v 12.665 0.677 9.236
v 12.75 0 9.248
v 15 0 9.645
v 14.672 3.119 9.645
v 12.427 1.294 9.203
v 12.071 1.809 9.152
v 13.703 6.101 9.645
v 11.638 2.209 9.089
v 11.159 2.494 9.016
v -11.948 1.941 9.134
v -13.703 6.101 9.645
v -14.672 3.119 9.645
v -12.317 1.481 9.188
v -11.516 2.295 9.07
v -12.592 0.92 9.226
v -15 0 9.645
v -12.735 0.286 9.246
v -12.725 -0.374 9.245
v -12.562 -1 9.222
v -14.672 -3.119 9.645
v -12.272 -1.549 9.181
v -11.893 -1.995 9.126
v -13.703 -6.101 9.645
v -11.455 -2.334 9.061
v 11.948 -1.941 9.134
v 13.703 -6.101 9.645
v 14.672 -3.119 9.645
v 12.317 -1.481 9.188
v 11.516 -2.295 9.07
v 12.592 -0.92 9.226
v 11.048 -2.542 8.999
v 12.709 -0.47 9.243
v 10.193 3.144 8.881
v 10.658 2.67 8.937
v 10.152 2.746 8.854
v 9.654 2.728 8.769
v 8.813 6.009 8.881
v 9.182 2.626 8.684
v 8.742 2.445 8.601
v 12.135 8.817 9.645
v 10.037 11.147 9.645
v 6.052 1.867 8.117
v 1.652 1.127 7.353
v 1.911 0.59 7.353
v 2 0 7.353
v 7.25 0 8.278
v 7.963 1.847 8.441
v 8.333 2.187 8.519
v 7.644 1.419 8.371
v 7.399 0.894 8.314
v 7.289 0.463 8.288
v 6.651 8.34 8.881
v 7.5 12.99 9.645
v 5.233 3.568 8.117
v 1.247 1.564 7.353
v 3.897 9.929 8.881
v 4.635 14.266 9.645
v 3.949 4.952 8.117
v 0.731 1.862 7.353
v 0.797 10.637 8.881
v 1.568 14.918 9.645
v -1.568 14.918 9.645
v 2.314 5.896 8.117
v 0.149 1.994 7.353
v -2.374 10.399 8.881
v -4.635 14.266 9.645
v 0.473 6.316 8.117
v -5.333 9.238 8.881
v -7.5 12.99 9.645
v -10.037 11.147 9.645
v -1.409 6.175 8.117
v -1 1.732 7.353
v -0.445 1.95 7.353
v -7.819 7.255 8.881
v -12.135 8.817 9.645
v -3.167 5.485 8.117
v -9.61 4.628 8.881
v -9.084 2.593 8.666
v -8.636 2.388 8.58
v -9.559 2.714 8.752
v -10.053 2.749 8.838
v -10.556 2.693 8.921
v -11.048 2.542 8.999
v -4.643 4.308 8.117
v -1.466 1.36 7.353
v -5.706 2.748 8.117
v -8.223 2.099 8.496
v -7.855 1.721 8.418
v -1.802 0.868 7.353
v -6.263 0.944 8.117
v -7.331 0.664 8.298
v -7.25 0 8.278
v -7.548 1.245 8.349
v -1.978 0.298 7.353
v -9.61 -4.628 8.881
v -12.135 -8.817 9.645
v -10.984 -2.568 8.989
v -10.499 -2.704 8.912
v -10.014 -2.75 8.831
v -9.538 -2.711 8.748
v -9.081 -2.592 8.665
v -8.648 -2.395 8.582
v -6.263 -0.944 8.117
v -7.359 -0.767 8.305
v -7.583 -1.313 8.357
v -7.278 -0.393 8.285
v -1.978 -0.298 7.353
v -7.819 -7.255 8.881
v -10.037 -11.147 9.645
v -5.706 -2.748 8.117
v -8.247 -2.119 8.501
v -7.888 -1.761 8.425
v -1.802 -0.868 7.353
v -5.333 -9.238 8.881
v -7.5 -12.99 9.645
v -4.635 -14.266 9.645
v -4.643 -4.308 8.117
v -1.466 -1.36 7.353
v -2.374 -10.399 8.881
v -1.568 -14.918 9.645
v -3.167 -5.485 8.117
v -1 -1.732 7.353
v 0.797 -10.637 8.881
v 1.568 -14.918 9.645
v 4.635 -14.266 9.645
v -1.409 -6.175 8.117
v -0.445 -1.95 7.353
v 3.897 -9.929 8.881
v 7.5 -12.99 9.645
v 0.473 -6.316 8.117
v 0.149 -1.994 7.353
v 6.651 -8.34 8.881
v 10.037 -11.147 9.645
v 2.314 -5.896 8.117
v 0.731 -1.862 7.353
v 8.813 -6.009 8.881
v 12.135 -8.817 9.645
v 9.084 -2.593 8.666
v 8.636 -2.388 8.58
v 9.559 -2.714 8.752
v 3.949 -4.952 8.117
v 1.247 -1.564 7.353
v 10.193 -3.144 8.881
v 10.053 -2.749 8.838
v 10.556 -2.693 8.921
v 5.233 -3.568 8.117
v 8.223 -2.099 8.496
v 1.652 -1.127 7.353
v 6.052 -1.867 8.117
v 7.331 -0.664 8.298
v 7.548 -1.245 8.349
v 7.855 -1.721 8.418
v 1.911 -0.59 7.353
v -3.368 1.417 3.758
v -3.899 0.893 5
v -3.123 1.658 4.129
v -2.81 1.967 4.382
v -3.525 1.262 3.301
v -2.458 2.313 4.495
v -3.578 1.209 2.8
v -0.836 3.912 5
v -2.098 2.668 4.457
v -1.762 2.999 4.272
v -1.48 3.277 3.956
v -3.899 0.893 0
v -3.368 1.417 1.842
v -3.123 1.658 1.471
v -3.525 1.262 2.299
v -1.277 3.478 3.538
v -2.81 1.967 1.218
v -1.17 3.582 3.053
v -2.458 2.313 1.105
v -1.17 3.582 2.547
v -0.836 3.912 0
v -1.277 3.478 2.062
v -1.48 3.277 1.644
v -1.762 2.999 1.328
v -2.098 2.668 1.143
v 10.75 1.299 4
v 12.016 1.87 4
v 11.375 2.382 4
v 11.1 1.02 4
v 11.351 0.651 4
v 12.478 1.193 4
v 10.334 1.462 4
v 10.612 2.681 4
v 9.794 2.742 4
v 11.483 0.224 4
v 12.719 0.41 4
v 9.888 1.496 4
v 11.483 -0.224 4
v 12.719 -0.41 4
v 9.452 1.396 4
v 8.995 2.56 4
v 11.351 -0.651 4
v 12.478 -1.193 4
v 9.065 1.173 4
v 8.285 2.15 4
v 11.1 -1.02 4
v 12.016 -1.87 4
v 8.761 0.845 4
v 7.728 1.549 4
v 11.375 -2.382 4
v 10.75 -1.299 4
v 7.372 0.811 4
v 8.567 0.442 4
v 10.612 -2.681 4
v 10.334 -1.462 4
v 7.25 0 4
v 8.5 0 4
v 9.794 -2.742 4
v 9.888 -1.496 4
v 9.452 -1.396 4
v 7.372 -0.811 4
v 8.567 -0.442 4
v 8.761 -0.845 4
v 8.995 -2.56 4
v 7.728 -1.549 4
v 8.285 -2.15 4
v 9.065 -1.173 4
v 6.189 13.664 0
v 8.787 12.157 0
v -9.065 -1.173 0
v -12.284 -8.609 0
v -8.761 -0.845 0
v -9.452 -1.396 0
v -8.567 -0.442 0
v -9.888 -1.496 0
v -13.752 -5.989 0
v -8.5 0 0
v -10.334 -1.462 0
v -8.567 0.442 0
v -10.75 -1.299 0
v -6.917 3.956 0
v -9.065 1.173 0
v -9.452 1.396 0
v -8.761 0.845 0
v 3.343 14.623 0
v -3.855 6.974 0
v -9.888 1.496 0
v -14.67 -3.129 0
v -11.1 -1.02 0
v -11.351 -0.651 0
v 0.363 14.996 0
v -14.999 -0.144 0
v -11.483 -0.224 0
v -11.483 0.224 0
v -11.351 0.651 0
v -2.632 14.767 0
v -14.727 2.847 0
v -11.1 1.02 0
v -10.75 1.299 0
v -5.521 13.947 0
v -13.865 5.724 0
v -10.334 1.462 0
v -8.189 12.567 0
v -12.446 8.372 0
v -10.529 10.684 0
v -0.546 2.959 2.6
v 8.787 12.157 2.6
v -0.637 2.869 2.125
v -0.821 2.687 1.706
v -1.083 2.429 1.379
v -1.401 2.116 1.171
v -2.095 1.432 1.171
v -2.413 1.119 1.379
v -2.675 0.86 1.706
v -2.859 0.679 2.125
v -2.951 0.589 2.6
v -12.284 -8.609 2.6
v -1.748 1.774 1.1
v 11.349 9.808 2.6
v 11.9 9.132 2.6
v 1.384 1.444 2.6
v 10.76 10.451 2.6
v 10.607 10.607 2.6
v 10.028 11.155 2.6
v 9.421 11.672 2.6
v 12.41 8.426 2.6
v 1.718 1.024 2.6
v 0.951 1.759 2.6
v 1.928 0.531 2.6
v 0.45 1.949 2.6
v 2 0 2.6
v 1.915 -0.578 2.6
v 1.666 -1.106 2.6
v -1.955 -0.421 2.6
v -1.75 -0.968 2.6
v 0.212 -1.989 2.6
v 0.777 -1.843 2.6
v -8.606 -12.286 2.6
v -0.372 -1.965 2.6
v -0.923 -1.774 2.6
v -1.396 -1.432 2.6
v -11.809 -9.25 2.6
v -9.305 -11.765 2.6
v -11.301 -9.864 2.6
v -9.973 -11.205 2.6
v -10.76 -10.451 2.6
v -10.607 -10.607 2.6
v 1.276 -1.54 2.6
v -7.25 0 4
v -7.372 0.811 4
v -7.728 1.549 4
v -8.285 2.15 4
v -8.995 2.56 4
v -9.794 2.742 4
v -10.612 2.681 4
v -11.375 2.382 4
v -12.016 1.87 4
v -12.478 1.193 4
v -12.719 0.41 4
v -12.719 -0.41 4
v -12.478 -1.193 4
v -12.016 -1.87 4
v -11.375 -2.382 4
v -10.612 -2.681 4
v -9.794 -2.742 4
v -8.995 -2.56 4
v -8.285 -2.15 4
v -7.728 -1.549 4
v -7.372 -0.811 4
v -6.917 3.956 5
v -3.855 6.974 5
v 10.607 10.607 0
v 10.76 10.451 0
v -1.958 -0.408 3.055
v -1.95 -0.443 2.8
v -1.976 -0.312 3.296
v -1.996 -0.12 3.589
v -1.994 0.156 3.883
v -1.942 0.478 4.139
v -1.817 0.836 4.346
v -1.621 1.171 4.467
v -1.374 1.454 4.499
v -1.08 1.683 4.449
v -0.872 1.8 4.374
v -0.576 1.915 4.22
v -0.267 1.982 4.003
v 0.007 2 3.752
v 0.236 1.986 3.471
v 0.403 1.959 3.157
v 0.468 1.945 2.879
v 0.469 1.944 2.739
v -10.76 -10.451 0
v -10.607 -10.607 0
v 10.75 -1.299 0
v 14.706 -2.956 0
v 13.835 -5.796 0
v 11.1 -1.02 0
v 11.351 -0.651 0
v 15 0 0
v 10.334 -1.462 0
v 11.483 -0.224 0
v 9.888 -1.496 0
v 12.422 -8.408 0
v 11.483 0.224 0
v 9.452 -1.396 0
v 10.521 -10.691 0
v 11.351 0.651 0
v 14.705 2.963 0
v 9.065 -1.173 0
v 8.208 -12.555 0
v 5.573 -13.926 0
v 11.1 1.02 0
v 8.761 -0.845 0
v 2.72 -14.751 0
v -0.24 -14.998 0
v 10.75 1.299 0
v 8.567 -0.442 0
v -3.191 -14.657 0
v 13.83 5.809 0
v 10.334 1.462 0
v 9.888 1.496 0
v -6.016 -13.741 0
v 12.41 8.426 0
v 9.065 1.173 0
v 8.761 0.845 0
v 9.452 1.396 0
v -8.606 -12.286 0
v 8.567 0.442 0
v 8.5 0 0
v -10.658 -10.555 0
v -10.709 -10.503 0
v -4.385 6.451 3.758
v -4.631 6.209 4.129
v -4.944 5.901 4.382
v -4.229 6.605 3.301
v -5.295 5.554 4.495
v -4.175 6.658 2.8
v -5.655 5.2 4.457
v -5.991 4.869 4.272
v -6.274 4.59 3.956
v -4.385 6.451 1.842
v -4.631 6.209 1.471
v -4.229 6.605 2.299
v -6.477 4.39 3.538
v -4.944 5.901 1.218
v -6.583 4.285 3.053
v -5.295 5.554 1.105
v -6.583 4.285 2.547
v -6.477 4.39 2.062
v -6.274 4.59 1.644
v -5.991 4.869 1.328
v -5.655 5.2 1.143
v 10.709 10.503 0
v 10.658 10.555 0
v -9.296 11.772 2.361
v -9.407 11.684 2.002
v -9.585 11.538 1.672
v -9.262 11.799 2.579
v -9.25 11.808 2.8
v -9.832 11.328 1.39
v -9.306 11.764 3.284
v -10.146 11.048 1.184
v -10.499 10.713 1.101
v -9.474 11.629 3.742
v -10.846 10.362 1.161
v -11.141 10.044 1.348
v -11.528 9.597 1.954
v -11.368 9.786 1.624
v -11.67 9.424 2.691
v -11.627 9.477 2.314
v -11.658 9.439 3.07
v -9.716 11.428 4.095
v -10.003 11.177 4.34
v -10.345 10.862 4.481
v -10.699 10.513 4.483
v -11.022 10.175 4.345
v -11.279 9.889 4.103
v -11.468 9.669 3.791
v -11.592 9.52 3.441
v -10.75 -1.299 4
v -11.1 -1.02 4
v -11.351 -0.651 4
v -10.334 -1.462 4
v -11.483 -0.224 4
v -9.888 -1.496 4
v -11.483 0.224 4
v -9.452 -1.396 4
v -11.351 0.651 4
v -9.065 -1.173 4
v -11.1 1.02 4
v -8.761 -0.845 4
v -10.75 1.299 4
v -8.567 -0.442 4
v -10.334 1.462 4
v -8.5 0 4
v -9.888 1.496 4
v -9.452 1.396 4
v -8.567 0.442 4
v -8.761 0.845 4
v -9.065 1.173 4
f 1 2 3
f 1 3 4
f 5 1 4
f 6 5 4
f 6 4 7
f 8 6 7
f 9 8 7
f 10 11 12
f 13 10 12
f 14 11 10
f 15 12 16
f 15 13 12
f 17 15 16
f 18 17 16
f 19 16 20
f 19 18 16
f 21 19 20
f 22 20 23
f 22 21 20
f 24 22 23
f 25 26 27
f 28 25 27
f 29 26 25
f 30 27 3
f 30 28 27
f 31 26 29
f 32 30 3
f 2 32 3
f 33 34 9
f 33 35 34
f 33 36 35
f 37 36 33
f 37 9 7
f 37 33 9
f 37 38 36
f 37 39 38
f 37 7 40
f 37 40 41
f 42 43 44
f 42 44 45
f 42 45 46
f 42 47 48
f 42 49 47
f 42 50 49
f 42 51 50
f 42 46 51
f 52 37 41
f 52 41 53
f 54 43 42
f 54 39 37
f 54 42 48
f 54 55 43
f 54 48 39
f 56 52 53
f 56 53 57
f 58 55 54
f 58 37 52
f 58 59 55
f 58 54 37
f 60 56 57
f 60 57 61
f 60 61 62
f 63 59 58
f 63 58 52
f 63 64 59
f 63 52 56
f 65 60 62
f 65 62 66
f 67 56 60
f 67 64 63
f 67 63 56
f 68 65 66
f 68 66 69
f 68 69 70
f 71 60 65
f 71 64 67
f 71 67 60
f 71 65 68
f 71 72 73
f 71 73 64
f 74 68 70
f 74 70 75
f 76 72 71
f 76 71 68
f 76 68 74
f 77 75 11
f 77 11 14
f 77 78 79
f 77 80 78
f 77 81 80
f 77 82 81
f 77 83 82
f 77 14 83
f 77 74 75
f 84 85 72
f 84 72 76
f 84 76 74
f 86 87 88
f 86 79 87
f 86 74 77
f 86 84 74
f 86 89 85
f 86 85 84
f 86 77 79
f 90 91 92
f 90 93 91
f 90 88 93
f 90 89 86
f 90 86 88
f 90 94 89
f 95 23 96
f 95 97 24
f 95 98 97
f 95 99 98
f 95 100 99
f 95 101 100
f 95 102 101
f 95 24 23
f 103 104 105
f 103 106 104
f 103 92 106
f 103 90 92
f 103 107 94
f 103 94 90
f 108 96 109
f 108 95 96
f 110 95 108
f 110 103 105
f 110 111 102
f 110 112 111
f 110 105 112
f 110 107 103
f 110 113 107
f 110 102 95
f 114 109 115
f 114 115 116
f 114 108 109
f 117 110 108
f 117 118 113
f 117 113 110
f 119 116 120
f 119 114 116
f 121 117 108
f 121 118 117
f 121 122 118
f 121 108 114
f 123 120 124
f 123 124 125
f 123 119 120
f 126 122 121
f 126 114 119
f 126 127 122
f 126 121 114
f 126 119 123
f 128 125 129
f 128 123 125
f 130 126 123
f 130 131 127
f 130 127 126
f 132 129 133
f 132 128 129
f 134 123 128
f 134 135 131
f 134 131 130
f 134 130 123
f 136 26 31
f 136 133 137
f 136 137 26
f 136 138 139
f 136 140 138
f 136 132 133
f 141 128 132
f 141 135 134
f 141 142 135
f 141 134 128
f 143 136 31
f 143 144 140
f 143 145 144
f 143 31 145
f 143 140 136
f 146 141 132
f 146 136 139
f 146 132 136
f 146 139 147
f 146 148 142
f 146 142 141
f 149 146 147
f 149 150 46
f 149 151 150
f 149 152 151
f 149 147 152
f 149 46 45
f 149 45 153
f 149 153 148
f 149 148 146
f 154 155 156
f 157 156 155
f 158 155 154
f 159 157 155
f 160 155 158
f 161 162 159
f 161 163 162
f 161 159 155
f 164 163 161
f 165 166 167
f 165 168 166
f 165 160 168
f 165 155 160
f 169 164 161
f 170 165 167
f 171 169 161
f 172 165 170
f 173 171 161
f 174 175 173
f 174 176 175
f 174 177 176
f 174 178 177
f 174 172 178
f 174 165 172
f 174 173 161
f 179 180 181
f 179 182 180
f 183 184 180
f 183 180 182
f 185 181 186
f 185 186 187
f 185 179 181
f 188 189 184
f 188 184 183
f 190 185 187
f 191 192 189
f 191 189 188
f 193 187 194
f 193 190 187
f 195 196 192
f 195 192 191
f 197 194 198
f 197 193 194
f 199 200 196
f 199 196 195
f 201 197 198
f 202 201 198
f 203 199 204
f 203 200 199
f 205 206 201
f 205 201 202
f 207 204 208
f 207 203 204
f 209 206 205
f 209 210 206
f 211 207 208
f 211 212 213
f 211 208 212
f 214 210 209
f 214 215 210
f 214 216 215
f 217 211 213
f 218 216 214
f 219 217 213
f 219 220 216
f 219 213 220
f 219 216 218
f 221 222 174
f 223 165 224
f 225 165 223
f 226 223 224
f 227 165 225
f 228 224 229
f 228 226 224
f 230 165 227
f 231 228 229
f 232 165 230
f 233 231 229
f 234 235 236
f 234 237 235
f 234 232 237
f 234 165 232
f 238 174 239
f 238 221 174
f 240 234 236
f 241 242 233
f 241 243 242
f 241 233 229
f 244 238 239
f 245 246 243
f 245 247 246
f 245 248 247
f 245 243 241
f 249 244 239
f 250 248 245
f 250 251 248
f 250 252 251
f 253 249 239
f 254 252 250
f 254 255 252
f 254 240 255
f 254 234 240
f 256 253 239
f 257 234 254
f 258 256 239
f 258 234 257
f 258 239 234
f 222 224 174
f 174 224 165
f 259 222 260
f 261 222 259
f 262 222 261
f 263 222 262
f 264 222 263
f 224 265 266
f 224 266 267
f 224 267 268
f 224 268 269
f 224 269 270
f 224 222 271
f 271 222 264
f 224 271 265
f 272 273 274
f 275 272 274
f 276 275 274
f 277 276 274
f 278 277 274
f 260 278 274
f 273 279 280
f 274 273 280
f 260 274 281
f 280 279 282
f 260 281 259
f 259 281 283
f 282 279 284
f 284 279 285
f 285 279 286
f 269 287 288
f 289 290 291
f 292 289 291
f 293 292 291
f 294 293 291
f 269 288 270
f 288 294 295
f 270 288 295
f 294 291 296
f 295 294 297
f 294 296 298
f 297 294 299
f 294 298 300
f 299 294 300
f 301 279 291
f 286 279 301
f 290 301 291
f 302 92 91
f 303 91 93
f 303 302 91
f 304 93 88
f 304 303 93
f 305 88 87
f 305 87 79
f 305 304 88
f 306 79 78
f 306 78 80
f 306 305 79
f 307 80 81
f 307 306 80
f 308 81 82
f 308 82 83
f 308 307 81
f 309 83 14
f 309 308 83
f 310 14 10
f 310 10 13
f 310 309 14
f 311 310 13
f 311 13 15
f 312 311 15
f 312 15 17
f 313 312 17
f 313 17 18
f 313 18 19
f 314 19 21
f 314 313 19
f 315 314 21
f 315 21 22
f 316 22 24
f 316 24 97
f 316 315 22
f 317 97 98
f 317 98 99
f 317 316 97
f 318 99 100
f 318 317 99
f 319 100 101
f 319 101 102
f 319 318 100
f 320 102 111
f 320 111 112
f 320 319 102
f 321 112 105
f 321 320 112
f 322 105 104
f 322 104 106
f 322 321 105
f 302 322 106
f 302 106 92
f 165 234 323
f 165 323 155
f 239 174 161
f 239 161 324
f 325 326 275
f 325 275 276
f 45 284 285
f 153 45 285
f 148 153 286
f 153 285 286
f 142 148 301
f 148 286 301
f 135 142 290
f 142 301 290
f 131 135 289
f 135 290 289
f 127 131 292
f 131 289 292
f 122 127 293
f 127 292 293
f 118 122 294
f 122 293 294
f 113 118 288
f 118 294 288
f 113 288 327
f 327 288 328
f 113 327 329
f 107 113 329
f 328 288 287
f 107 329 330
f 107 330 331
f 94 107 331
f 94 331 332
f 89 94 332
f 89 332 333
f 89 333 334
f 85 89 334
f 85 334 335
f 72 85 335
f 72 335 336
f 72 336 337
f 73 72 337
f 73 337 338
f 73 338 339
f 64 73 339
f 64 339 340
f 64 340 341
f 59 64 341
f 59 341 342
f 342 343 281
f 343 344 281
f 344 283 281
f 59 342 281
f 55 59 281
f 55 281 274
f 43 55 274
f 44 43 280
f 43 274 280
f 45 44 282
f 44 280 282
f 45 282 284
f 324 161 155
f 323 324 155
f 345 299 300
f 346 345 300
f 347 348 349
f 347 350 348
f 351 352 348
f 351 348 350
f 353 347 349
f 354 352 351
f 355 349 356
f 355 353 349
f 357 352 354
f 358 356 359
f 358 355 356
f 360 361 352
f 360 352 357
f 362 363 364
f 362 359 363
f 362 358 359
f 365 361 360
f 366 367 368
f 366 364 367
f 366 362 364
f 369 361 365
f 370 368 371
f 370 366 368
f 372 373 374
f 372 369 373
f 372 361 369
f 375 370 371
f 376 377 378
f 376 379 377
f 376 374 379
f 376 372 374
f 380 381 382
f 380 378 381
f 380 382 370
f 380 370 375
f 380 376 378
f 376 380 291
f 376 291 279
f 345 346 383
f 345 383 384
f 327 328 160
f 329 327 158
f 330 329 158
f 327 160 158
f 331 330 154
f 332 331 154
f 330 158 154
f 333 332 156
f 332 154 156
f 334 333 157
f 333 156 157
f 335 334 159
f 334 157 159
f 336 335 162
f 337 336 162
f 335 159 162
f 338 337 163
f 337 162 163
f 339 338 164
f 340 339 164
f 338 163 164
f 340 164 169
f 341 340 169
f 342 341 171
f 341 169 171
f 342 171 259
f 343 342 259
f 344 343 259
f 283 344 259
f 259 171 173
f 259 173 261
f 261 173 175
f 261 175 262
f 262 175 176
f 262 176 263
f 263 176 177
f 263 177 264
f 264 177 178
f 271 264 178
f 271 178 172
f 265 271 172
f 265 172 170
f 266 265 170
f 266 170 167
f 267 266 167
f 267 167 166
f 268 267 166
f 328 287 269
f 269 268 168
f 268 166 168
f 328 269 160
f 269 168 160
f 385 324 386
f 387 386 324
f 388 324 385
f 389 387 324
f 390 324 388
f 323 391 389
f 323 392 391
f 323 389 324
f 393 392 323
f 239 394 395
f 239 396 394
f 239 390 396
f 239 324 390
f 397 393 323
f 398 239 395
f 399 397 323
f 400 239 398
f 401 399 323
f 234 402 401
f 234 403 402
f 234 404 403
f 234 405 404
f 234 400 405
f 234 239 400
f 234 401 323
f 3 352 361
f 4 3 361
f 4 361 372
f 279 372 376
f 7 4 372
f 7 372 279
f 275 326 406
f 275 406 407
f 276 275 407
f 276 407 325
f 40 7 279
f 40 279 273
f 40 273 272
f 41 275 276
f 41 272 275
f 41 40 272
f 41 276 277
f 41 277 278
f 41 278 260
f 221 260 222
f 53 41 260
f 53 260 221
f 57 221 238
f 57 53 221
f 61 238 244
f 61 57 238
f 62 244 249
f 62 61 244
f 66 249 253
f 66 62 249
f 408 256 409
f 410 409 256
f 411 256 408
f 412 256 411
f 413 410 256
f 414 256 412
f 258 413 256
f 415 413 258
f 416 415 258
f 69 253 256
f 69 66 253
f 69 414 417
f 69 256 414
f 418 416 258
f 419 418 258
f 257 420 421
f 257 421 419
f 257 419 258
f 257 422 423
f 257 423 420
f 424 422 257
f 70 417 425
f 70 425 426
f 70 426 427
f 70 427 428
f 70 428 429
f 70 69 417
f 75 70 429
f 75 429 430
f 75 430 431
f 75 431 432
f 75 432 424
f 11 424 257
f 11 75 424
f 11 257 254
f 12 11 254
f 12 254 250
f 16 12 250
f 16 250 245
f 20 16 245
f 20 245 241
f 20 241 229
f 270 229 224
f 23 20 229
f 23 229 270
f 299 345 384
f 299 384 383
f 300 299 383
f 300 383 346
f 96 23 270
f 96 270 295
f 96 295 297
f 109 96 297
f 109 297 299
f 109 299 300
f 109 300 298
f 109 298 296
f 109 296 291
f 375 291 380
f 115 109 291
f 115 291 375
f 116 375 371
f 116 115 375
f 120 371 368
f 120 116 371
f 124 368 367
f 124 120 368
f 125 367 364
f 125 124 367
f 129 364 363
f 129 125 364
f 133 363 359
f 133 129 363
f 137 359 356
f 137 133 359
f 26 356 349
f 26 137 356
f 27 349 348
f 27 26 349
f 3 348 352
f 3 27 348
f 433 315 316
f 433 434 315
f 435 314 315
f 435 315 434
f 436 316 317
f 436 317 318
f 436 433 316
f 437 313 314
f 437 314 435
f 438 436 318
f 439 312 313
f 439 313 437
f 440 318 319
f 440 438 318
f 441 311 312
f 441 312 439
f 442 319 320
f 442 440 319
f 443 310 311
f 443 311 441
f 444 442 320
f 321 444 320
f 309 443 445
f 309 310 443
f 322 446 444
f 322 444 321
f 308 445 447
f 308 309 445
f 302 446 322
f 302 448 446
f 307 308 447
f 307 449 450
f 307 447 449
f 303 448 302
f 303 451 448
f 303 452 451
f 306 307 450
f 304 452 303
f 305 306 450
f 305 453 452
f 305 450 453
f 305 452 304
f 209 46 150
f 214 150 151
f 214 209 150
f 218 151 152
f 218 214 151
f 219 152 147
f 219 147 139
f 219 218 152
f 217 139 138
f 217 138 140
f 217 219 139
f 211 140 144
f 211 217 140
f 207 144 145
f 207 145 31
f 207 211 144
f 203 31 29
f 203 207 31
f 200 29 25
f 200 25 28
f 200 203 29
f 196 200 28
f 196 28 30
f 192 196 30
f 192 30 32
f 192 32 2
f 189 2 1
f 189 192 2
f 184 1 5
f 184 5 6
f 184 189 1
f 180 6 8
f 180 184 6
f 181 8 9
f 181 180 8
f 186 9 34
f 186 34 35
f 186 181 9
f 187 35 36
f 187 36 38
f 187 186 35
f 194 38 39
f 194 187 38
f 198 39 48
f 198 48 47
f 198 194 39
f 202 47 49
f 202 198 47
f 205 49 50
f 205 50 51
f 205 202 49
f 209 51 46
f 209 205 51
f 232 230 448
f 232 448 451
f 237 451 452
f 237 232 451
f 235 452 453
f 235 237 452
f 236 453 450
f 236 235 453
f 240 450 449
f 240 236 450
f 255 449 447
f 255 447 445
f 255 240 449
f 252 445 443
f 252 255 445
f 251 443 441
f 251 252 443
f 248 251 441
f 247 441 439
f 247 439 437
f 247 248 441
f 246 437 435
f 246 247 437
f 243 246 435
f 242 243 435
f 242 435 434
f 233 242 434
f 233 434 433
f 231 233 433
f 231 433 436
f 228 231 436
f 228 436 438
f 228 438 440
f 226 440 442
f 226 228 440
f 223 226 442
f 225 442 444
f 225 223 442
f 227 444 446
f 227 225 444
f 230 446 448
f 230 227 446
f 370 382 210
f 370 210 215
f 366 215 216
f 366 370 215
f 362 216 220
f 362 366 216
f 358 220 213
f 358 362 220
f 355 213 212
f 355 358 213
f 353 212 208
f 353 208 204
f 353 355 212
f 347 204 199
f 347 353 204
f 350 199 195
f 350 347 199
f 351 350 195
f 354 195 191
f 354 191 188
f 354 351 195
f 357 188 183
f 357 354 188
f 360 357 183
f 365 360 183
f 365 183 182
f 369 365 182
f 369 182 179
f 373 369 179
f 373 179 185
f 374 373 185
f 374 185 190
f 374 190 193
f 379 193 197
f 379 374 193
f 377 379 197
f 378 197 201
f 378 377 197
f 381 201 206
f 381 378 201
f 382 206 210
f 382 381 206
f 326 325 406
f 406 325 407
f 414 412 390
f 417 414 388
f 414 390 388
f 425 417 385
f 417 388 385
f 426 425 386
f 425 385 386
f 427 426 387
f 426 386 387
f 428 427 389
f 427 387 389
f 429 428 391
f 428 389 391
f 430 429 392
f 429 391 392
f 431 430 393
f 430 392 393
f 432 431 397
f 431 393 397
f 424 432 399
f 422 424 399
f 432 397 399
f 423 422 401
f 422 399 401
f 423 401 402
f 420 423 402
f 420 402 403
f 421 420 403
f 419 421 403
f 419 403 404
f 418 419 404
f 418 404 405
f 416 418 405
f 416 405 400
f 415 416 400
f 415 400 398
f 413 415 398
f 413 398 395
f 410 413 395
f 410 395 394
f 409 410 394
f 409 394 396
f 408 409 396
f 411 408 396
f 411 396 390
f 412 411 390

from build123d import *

# Parameters (mm, degrees)
REVOLVE_ONTO_SKETCH002_ROLL_ANGLE = 90.0000000001
ARRAY_COUNT                       = 2
SKETCH001_R                       = 2
POCKET_DEPTH                      = 9.6459047106
POCKET001_DEPTH                   = 2.6
POCKET002_DEPTH                   = 5
SKETCH005_R                       = 1.7
POCKET003_DEPTH                   = 3
SKETCH006_R                       = 1.7
POCKET004_DEPTH                   = 7.3269450049


with BuildPart() as array:
    # Sketch002 as drawn → Revolve (revolve)
    with BuildSketch(Plane.XY):
        Polygon((7.25, 10), (7.25, 4), (8.5, 4), (8.5, -1), (10, -1), (10, 10), align=None)
    revolve(axis=Axis((10, -1, 0), (0, 1, 0)))


with BuildPart() as array_1:
    # Revolve onto Sketch002 roll: moved
    add(array.part.rotate(Axis((0, 0, 0), (1, 0, 0)), REVOLVE_ONTO_SKETCH002_ROLL_ANGLE))


with BuildPart() as array_2:
    # Revolve onto Sketch002 placement: moved
    add(array_1.part)

    # Array: Array ×2 about axis
    array_axis = Axis((0, 0, 0), (0, 0, 1))


with BuildPart() as array_3:
    add(array_2.part)
    for i in range(1, ARRAY_COUNT):
        add(array_2.part.rotate(array_axis, i * 360 / ARRAY_COUNT))


with BuildPart() as pocket004:
    # Sketch → Revolution (revolve)
    with BuildSketch(Plane.XZ):
        Polygon((0, 0), (15, 0), (15, 9.6449047106), (0, 7), align=None)
    revolve(axis=Axis((0, 0, 0), (0, 0, 1)))

    # Sketch001 → Pocket (cut, through all)
    with BuildSketch(Plane(origin=(0, 0, 0), x_dir=(1, 0, 0), z_dir=(0, 0, -1))):
        Circle(SKETCH001_R)
    extrude(amount=-POCKET_DEPTH, mode=Mode.SUBTRACT)

    # Cut: cut Array
    add(array_3.part, mode=Mode.SUBTRACT)

    # Sketch003 → Pocket001 (cut)
    with BuildSketch(Plane(origin=(0, 0, 0), x_dir=(1, 0, 0), z_dir=(0, 0, -1))):
        Polygon((-12.4316043172, 8.7547471036), (-8.7815991184, 12.458456332), (12.5853843422, -8.5987044497), (8.9353791434, -12.3024136782), align=None)
    extrude(amount=-POCKET001_DEPTH, mode=Mode.SUBTRACT)

    # Sketch004 → Pocket002 (cut)
    with BuildSketch(Plane(origin=(0, 0, 0), x_dir=(1, 0, 0), z_dir=(0, 0, -1))):
        Polygon((-6.9172433584, -3.9560102728), (-3.8989698287, -0.8933276416), (-0.8362871974, -3.9116011713), (-3.8545607272, -6.9742838025), align=None)
    extrude(amount=-POCKET002_DEPTH, mode=Mode.SUBTRACT)

    # Sketch005 → Pocket003 (cut)
    with BuildSketch(Plane(origin=(-2.367628513, 2.4024644064, 0), x_dir=(-0.7122517747, -0.7019240767, 0), z_dir=(-0.7019240767, 0.7122517747, 0))):
        with Locations((0, 2.8)):
            Circle(SKETCH005_R)
    extrude(amount=-POCKET003_DEPTH, mode=Mode.SUBTRACT)

    # Sketch006 → Pocket004 (cut)
    with BuildSketch(Plane(origin=(-5.3859020428, 5.4651470377, 0), x_dir=(0.7122517747, 0.7019240767, 0), z_dir=(0.7019240767, -0.7122517747, 0))):
        with Locations((0, 2.8)):
            Circle(SKETCH006_R)
    extrude(amount=-POCKET004_DEPTH, mode=Mode.SUBTRACT)


solid = pocket004.part
